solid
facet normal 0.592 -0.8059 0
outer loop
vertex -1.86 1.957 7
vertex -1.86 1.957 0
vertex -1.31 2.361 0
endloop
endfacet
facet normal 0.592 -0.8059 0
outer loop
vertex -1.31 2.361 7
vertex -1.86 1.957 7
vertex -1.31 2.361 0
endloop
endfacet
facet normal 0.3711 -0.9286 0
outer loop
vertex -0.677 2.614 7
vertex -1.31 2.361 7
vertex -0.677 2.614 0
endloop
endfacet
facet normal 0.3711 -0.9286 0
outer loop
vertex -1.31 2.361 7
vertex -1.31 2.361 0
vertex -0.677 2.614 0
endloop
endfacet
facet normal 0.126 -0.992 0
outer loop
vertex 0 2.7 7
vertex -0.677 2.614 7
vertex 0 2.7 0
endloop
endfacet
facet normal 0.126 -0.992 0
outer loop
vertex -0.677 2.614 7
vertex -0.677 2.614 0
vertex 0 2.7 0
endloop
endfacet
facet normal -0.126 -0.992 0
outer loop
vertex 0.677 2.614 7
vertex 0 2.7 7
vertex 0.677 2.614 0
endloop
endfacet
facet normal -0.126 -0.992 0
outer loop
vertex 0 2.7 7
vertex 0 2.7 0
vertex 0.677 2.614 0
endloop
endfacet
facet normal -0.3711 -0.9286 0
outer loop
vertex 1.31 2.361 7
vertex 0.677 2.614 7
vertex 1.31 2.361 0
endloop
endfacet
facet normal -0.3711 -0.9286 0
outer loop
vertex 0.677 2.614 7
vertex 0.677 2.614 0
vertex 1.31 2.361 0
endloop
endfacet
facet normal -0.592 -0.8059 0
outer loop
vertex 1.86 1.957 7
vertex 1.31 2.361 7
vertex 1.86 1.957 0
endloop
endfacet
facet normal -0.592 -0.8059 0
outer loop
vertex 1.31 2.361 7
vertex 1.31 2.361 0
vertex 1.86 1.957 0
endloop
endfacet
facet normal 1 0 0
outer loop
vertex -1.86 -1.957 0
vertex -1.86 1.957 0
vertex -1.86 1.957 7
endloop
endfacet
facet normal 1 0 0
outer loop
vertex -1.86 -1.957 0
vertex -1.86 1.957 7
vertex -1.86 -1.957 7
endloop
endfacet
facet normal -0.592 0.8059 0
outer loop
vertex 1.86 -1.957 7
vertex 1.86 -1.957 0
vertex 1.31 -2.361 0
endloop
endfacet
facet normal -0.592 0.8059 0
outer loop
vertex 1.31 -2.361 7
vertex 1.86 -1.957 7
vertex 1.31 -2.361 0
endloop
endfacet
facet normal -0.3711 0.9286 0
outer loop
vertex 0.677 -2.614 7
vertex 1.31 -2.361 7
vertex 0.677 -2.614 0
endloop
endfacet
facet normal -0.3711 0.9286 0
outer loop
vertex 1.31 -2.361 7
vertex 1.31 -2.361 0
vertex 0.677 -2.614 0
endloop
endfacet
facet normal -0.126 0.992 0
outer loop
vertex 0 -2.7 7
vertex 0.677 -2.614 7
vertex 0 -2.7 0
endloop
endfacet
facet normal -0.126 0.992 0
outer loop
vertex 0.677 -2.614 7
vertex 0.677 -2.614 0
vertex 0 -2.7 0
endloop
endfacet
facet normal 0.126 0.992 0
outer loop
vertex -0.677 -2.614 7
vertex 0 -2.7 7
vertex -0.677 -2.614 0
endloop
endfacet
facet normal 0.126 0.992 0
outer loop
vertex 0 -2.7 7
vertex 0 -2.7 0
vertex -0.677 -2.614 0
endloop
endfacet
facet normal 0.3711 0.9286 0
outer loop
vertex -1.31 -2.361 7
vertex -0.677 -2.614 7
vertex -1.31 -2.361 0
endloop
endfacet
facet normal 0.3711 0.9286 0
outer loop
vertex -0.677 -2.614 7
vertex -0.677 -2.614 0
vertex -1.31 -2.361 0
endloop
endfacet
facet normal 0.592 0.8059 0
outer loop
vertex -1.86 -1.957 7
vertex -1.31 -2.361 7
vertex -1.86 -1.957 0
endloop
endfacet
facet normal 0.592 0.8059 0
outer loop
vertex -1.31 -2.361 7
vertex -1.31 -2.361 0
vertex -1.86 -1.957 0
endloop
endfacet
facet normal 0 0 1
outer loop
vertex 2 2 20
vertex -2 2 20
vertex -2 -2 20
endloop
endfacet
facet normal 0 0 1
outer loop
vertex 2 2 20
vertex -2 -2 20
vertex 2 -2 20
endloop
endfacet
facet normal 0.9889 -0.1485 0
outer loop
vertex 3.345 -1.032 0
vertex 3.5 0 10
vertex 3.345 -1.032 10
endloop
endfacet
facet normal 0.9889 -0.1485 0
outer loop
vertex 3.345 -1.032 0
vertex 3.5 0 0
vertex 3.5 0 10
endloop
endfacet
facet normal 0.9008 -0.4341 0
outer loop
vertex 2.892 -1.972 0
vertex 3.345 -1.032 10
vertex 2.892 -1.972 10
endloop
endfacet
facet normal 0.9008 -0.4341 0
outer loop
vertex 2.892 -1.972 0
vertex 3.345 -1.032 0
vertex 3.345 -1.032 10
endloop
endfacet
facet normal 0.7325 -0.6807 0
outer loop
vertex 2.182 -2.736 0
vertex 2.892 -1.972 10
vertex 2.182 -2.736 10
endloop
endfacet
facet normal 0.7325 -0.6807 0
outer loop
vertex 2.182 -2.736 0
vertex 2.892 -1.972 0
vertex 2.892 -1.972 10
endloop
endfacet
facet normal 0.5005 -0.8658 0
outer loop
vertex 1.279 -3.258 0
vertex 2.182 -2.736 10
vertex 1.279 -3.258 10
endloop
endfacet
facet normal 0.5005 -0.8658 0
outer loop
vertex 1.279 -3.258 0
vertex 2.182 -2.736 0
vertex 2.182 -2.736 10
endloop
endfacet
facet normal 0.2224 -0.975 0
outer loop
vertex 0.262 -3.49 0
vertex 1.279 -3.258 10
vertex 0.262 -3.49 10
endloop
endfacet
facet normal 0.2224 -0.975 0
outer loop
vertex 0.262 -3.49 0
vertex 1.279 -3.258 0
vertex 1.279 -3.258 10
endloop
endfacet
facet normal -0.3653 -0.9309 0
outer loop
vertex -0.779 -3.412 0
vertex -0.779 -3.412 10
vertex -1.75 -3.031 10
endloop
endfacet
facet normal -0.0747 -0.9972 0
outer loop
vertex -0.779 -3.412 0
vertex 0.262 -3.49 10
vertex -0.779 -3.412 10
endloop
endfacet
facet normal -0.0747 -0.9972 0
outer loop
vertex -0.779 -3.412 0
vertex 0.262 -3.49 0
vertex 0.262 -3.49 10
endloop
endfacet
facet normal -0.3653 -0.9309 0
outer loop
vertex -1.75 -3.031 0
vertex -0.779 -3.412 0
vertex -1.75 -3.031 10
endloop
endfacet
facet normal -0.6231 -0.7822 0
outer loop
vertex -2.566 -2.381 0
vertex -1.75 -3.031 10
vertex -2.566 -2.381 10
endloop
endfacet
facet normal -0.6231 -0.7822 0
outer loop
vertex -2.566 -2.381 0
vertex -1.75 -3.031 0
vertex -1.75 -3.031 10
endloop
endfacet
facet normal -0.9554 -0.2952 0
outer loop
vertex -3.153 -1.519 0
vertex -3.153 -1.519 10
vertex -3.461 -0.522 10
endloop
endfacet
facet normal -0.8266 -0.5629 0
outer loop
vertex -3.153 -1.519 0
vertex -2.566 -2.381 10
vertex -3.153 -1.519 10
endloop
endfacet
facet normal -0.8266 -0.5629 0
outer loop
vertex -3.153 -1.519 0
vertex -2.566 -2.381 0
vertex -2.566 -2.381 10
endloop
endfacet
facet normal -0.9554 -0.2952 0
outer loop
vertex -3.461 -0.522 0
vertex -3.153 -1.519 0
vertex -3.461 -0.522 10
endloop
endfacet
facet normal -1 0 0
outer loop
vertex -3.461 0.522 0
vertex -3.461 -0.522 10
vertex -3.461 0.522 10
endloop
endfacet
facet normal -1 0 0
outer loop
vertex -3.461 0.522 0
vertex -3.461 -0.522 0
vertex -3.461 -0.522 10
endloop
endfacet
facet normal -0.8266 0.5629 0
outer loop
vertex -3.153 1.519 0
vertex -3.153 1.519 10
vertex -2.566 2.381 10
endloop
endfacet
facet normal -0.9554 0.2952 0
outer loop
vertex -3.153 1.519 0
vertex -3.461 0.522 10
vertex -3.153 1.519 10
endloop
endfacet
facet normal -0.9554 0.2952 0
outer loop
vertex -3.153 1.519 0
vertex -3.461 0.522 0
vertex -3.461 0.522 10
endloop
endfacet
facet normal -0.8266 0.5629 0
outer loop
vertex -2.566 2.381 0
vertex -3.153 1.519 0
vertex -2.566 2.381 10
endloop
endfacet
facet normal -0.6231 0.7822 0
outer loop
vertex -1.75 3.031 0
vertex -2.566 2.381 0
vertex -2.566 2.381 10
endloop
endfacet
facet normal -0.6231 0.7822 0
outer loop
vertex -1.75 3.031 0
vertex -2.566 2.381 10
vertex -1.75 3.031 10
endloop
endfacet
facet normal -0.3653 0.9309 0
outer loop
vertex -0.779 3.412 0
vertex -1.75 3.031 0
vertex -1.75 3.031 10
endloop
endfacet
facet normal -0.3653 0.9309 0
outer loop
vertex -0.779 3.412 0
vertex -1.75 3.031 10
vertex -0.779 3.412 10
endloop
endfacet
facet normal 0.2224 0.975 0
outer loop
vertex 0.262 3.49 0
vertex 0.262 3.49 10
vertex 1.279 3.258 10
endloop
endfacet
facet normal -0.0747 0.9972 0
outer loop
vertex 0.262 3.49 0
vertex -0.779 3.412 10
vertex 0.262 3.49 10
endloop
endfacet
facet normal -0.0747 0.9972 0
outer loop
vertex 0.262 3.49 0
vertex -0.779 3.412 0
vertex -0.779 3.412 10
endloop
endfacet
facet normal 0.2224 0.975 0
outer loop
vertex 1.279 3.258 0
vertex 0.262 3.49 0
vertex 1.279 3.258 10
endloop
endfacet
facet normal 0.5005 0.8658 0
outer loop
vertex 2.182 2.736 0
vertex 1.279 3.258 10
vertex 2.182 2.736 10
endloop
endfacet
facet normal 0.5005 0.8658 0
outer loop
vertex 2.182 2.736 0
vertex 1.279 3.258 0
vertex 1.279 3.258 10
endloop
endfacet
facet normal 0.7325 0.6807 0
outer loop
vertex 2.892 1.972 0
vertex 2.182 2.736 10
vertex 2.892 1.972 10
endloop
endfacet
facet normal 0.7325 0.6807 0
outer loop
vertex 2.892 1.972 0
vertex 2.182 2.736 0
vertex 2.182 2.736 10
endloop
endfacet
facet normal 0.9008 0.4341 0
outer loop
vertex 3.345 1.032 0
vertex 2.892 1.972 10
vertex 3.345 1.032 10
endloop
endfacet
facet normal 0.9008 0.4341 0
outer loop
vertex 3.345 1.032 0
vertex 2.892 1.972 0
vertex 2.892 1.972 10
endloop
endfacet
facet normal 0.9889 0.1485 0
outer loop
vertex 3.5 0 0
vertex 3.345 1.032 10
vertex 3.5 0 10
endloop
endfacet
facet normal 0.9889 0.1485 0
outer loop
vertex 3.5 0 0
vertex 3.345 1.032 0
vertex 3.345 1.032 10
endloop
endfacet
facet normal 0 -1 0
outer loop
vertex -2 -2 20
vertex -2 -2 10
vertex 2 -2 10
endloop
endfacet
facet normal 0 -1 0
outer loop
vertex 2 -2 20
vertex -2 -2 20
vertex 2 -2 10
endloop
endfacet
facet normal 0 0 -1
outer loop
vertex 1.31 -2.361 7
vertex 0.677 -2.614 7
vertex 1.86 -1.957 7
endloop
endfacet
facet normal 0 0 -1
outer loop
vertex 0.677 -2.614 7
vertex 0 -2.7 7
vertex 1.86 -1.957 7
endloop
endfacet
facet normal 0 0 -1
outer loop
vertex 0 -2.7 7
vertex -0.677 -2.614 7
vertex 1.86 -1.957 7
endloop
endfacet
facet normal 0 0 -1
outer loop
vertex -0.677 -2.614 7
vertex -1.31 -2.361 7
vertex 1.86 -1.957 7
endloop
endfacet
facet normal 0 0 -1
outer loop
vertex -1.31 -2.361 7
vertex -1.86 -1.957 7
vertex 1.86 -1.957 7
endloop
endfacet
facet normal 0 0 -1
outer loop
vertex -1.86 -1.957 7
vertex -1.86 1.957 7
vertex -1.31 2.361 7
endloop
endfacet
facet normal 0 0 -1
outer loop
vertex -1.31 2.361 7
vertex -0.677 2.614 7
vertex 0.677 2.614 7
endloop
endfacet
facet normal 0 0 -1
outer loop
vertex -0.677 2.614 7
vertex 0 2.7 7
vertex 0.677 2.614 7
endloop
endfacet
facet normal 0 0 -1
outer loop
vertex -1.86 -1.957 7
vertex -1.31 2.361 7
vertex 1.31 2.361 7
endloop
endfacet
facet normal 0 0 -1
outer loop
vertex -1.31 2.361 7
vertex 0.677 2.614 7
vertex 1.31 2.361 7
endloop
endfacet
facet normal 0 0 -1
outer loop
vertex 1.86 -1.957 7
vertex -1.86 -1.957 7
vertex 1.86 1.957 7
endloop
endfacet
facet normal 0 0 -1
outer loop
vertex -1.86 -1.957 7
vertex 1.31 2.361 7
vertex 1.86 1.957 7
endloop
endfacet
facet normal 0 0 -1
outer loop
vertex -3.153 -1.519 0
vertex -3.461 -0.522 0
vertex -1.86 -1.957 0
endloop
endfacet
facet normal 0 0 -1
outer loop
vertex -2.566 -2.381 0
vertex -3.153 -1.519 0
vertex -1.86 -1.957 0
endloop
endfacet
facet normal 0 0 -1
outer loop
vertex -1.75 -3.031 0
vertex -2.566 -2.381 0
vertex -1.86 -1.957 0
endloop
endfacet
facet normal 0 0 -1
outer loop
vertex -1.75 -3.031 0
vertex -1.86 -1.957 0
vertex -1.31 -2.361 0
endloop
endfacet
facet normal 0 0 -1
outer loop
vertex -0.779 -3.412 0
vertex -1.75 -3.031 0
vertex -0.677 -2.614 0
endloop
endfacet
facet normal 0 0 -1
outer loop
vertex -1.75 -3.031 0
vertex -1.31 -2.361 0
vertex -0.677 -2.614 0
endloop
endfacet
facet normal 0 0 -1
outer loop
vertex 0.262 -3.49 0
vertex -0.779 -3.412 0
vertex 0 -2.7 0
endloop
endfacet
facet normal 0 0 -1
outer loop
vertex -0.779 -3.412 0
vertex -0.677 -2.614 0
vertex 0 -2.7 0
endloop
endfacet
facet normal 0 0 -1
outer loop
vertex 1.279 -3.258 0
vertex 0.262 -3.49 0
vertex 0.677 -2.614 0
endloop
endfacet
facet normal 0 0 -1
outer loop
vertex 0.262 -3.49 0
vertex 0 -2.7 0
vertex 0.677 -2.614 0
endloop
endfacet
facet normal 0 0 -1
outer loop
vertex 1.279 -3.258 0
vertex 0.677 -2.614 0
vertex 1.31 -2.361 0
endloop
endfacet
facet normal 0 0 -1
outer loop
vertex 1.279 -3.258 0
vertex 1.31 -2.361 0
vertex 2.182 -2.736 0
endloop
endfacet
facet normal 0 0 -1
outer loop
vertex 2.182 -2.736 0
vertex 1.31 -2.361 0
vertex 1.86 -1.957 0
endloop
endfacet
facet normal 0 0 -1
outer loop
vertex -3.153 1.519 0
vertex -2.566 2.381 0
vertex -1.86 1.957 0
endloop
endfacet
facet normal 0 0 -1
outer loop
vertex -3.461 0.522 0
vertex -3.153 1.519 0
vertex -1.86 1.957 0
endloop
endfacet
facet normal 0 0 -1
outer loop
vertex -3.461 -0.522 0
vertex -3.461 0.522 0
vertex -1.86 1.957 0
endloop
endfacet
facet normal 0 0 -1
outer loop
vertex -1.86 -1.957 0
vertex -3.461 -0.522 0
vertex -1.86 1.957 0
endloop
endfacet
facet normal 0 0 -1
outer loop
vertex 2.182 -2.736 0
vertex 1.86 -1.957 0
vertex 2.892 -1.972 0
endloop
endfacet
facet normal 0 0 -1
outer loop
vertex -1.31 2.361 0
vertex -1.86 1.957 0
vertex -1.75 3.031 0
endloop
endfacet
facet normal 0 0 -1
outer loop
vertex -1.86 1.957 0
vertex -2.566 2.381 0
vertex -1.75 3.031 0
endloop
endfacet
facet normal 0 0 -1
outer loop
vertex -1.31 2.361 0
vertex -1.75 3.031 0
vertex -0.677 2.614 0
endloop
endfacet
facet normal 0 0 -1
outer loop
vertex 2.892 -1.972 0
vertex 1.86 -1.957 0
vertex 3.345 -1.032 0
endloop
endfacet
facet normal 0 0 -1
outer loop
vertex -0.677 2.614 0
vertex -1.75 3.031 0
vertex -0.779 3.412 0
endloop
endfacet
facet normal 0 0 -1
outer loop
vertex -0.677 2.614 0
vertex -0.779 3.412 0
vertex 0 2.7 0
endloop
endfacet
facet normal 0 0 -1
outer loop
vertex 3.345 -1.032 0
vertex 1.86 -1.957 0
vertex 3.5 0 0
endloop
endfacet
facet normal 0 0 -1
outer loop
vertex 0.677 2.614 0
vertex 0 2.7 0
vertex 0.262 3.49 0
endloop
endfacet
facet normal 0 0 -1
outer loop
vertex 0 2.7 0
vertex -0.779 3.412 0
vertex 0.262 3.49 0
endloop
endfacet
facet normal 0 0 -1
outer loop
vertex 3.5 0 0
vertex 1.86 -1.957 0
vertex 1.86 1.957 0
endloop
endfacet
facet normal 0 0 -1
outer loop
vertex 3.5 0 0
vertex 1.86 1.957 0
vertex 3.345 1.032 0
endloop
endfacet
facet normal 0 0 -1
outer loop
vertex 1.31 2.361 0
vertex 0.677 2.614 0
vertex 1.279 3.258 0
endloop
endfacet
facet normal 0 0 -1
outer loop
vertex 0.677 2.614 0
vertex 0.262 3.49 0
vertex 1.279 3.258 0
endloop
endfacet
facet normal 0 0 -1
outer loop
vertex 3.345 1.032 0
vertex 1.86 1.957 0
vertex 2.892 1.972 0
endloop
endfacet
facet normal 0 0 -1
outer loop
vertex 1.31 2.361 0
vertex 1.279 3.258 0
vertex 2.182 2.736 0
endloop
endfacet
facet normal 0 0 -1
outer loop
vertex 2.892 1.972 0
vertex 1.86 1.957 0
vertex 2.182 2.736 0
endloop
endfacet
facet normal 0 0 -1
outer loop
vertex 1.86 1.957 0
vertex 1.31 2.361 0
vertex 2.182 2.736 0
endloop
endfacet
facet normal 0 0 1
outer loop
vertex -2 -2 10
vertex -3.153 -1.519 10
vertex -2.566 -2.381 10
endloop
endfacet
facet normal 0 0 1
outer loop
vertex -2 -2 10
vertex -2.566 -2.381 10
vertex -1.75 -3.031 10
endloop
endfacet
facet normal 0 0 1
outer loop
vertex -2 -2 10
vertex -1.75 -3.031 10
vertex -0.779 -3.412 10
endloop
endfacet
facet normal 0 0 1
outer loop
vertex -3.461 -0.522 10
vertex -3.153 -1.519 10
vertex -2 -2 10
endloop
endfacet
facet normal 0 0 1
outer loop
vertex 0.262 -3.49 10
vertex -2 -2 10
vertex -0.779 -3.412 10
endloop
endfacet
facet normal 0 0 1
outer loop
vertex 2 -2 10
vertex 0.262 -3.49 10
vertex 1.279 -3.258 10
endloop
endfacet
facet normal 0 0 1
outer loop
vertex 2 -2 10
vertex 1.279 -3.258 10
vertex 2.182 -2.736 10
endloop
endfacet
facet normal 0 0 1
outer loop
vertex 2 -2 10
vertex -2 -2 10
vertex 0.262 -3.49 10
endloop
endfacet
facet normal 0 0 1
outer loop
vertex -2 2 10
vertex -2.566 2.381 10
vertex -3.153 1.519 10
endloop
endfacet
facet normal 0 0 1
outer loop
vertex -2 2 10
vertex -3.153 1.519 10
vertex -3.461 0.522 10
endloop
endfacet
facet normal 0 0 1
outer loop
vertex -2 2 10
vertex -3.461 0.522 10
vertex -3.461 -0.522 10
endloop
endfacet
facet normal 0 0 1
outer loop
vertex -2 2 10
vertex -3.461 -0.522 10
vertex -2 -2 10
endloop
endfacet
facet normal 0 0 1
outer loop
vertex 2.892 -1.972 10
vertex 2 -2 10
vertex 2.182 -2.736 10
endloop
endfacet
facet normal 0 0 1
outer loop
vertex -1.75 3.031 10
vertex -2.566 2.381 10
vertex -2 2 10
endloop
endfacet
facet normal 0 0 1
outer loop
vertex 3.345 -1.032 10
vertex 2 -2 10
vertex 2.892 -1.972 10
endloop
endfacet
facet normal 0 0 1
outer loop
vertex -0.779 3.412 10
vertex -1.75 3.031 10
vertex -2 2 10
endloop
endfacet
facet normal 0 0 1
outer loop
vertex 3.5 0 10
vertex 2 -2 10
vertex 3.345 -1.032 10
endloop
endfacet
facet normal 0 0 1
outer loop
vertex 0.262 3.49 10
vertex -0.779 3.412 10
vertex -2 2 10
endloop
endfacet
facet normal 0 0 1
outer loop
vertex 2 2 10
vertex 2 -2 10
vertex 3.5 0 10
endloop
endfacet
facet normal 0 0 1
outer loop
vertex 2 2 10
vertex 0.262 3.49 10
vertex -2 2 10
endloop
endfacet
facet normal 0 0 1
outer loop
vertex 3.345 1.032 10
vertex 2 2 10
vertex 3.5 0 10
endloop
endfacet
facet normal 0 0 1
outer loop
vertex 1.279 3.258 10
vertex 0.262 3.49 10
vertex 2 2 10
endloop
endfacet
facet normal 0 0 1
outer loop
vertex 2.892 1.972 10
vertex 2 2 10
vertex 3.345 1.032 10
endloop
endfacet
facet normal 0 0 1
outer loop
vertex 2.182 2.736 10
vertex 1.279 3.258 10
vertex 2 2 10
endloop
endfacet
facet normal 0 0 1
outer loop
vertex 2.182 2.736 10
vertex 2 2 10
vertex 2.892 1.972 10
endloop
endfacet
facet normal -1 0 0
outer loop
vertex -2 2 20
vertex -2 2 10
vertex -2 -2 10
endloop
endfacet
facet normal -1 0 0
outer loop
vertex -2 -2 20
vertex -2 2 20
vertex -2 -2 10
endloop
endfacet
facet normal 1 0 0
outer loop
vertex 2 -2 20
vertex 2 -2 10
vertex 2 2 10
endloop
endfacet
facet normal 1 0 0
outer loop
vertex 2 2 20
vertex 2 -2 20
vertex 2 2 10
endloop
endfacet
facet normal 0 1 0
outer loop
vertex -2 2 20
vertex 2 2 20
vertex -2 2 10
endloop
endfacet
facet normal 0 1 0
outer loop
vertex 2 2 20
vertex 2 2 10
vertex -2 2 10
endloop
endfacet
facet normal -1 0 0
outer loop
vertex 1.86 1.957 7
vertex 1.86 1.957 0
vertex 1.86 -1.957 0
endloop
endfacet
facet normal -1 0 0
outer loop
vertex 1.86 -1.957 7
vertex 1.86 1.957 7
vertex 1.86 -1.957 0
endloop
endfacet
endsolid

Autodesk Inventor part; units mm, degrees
ref_plane "YZ Plane" through (0, 0, 0) normal (1, 0, 0) x (0, 1, 0)
ref_plane "XZ Plane" through (0, 0, 0) normal (0, 1, 0) x (-1, 0, 0)
ref_plane "XY Plane" through (0, 0, 0) normal (0, 0, 1) x (1, 0, 0)
sketch "Sketch1" plane through (0, 0, 0) normal (0, 0, 1) x (1, 0, 0)
  circle A0 centre (0, 0) radius 3.5
  line L0 (1.86, 1.9571) -> (1.86, -1.9571)
  line L1 (0, 3.5) -> (0, -3.5)
  line L2 (-1.86, 1.9571) -> (-1.86, -1.9571)
  arc A1 (-1.86, -1.9571) -> (1.86, -1.9571) centre (0, 0) ccw
  arc A2 (1.86, 1.9571) -> (-1.86, 1.9571) centre (0, 0) ccw
  dimension "d0" = 7
  dimension "d1" = 2.7
  dimension "d2" = 3.72
extrude "Extrusion1" add sketch "Sketch1" along normal blind 7 contours A0 L1 A1 L0 A2 | L1 A2 L2 A1 A0
sketch "Sketch2" plane through (0, 0, 7) normal (0, 0, 1) x (1, 0, 0)
  circle A0 centre (0, 0) radius 3.5
  circle A1 centre (0, 0) radius 3.5 projected
extrude "Extrusion2" add sketch "Sketch2" along normal blind 3
sketch "Sketch3" plane through (0, 0, 10) normal (0, 0, 1) x (1, 0, 0)
  line L0 (-2, -2) -> (2, -2)
  line L1 (2, -2) -> (2, 2)
  line L2 (2, 2) -> (-2, 2)
  line L3 (-2, 2) -> (-2, -2)
  line L4 (-2, -2) -> (2, 2) construction
  line L5 (2, -2) -> (-2, 2) construction
  point P0 (0, 0)
  dimension "d7" = 4
  dimension "d8" = 4
extrude "Extrusion3" add sketch "Sketch3" along normal blind 10
properties part number "Geared Motor Transmission"
